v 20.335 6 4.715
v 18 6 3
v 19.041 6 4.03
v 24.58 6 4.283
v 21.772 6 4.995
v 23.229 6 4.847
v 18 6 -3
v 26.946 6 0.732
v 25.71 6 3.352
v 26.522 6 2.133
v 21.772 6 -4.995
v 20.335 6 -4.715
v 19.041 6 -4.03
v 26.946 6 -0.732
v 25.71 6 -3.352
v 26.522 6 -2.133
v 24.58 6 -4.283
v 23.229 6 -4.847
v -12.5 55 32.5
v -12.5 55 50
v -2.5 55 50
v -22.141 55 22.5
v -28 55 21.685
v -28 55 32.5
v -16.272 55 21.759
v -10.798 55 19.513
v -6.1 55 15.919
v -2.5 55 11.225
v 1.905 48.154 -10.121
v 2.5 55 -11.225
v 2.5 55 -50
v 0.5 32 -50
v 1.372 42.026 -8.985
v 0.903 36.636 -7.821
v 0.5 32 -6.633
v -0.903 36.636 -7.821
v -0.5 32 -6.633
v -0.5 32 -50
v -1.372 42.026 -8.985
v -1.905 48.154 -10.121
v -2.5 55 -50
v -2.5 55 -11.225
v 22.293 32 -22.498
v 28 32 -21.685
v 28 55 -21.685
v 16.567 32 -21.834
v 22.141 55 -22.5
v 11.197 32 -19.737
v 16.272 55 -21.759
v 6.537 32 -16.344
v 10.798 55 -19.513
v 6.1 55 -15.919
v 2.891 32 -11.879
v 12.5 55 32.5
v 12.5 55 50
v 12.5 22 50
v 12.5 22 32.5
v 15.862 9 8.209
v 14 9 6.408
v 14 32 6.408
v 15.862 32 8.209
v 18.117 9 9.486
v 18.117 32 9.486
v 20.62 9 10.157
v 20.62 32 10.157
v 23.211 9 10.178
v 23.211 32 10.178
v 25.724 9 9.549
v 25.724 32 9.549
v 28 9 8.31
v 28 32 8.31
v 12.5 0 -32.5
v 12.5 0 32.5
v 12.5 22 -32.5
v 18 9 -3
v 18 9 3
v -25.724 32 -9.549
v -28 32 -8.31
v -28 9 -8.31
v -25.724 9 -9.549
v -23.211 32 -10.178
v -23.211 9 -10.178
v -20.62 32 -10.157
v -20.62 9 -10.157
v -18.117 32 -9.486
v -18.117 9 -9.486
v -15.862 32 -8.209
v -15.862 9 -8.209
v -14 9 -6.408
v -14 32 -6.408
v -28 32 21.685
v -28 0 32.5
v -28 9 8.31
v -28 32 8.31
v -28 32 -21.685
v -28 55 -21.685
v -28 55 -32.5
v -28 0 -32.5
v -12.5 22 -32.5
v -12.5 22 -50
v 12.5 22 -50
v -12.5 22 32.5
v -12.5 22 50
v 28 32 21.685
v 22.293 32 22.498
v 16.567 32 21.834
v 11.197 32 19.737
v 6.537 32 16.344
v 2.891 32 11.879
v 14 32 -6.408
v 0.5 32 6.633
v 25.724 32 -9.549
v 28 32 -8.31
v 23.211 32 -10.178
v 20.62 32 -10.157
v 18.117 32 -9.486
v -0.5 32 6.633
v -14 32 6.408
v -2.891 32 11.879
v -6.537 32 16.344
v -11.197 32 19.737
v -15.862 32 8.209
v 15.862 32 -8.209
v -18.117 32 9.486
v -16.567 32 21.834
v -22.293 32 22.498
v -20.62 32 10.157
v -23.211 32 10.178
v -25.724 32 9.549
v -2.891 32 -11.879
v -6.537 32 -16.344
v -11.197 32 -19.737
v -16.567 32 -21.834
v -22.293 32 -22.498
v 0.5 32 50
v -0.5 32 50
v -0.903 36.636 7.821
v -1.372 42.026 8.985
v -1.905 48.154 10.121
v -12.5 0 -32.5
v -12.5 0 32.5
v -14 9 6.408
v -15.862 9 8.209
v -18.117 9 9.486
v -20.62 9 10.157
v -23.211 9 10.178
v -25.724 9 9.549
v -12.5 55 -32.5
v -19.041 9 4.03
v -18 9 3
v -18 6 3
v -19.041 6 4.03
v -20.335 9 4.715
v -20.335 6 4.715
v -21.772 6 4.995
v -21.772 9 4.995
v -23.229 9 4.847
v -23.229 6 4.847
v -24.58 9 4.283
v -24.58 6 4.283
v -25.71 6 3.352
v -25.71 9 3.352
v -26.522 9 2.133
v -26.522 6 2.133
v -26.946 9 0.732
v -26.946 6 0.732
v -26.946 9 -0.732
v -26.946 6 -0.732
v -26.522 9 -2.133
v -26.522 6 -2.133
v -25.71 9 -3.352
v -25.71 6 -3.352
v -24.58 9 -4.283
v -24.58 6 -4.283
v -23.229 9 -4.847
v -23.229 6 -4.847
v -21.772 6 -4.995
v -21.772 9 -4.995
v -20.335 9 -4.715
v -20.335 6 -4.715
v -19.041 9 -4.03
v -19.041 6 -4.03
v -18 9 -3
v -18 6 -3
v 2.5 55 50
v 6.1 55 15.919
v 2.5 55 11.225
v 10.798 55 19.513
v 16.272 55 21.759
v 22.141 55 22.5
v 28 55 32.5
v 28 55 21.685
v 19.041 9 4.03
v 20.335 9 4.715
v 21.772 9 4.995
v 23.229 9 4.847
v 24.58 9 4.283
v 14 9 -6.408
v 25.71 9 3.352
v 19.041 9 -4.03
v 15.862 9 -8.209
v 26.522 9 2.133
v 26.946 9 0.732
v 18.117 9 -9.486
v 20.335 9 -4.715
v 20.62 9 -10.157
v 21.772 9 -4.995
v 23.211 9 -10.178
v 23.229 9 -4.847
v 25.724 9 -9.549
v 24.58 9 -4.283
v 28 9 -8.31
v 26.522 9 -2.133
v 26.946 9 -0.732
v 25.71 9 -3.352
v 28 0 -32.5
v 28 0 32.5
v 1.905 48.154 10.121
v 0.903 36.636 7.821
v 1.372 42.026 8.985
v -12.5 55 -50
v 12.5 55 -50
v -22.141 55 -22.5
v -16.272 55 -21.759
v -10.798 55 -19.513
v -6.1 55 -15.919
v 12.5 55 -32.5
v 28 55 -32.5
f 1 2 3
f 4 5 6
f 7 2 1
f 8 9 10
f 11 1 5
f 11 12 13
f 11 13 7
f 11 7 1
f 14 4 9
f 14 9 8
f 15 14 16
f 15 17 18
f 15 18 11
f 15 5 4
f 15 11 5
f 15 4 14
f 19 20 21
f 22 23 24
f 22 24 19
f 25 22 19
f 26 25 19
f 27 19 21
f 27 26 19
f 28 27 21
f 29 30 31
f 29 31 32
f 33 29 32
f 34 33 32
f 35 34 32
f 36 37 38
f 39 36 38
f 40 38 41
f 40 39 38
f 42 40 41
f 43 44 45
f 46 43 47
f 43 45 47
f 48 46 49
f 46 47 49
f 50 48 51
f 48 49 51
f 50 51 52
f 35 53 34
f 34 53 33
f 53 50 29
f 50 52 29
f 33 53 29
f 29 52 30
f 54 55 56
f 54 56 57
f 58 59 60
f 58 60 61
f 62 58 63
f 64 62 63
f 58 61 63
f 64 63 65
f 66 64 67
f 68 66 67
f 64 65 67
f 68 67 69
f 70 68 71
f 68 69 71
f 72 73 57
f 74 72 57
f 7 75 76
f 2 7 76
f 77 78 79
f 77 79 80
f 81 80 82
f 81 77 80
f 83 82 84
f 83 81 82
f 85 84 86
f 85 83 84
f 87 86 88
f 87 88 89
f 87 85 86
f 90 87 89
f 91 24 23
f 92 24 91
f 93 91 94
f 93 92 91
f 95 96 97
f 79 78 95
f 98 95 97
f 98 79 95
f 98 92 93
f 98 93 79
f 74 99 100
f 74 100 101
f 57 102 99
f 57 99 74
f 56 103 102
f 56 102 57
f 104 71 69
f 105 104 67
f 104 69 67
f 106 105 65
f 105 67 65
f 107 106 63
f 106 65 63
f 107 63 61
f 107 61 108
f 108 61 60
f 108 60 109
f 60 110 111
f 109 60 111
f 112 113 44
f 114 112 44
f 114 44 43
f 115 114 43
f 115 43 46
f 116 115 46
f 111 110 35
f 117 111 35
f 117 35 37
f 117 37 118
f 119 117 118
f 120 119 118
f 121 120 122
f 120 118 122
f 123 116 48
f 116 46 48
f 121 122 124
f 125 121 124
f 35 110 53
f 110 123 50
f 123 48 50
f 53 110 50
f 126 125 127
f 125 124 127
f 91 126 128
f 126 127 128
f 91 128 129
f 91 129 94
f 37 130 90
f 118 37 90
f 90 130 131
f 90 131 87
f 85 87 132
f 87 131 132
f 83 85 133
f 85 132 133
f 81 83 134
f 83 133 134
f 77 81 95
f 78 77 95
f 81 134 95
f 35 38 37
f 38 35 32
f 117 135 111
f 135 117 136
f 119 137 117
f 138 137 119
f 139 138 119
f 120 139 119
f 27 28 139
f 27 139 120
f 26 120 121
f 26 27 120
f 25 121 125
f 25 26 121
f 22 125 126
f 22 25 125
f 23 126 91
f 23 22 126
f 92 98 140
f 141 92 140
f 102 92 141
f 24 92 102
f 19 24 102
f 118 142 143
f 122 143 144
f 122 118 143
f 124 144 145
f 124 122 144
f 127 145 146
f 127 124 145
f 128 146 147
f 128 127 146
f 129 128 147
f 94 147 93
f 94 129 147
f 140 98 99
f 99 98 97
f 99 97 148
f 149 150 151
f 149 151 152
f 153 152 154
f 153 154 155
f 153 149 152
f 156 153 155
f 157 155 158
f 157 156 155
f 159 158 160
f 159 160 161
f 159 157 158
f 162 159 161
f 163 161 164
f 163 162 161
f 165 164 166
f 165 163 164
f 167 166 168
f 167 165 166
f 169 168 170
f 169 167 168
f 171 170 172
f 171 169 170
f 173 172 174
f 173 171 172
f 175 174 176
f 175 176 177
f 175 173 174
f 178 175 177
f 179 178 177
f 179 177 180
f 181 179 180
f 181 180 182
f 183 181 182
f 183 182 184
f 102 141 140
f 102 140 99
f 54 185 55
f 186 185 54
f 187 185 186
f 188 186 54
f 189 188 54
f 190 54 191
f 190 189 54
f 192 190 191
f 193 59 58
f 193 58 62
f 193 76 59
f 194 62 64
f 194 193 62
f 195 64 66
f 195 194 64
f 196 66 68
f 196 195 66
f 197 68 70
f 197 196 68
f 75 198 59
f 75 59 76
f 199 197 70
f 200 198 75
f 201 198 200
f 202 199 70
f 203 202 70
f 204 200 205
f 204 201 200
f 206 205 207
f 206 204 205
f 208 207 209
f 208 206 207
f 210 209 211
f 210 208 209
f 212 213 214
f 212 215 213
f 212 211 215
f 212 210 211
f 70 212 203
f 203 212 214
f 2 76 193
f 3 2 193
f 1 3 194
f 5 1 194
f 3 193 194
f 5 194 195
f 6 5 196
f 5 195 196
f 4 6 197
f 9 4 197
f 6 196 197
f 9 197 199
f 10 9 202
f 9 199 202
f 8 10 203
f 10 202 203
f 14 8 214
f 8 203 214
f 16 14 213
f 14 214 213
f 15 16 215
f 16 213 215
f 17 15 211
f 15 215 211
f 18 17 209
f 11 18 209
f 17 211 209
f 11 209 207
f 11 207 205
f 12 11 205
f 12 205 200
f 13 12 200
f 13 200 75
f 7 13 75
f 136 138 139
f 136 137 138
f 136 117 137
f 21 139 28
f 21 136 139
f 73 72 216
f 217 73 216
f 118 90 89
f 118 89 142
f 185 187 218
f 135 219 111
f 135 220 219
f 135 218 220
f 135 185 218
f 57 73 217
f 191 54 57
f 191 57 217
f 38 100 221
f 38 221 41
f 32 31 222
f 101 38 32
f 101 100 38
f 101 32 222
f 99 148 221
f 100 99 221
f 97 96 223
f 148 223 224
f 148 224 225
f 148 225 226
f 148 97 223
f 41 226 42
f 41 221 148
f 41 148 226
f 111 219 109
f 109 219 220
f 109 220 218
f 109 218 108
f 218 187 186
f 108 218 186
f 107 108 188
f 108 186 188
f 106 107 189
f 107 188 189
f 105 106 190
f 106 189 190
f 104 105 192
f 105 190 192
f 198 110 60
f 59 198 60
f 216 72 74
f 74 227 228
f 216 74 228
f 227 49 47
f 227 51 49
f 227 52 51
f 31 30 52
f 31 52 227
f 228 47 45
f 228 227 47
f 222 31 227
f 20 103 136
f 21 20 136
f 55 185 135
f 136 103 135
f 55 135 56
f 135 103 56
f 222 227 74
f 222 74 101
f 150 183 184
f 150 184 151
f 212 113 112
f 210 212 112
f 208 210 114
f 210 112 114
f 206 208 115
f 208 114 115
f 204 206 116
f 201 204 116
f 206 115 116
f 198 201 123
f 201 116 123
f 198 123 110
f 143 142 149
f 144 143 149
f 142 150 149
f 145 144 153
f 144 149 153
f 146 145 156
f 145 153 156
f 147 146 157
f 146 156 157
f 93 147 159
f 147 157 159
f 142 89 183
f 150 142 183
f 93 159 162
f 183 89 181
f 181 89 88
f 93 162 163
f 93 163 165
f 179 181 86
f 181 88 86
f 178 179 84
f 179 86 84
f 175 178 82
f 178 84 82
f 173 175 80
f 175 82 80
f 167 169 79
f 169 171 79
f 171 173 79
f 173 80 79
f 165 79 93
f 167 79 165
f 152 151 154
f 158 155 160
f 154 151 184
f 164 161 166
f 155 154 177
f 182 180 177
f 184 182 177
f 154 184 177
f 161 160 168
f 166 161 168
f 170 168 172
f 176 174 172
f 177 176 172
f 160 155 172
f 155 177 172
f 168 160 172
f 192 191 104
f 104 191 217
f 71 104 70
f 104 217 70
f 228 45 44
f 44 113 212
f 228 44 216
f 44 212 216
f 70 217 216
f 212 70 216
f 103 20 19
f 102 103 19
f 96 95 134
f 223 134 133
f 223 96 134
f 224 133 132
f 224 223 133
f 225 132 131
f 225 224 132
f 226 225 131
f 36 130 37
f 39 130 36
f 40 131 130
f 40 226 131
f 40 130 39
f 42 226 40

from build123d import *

# Parameters (mm, degrees)
SKETCH1_W           = 56
SKETCH1_H           = 100
BOSS_EXTRUDE1_DEPTH = 55
CUT_EXTRUDE2_DEPTH  = 118.511701545
SKETCH7_R           = 22.5
SKETCH7_R_2         = 10
CUT_EXTRUDE4_DEPTH  = 23
CUT_EXTRUDE5_DEPTH  = 46
CUT_EXTRUDE6_DEPTH  = 3
CUT_EXTRUDE7_DEPTH  = 23
SKETCH12_W          = 15.5
SKETCH12_H          = 17.5
CUT_EXTRUDE8_DEPTH  = 80.429213769
SKETCH13_W          = 25
SKETCH13_H          = 22
CUT_EXTRUDE9_DEPTH  = 118.511701545


with BuildPart() as part:
    # Sketch1 → Boss-Extrude1 (new body)
    with BuildSketch(Plane(origin=(0, 0, 0), x_dir=(1, 0, 0), z_dir=(0, 1, 0))):
        Rectangle(SKETCH1_W, SKETCH1_H)
    extrude(amount=BOSS_EXTRUDE1_DEPTH)

    # Sketch3 → Cut-Extrude2 (cut, through all)
    with BuildSketch(Plane.XY.offset(50)):
        Polygon((-0.5, 32), (-2.5, 55), (2.5, 55), (0.5, 32), align=None)
    extrude(amount=-CUT_EXTRUDE2_DEPTH, mode=Mode.SUBTRACT)

    # Sketch7 → Cut-Extrude4 (cut)
    with BuildSketch(Plane(origin=(0, 55, 0), x_dir=(1, 0, 0), z_dir=(0, 1, 0))):
        with Locations((22, 0)):
            Circle(SKETCH7_R)
        with Locations((22, 0)):
            Circle(SKETCH7_R_2, mode=Mode.SUBTRACT)
    cut_extrude4 = extrude(amount=-CUT_EXTRUDE4_DEPTH, mode=Mode.SUBTRACT)

    # Sketch9 → Cut-Extrude5 (cut)
    with BuildSketch(Plane(origin=(0, 55, 0), x_dir=(1, 0, 0), z_dir=(0, 1, 0))):
        with BuildLine():
            Line((14, 6.408002809), (14, -6.408002809))
            ThreePointArc((14, -6.408002809), (32.25, 0), (14, 6.408002809))
        make_face()
    cut_extrude5 = extrude(amount=-CUT_EXTRUDE5_DEPTH, mode=Mode.SUBTRACT)

    # Sketch10 → Cut-Extrude6 (cut)
    with BuildSketch(Plane(origin=(0, 9, 0), x_dir=(1, 0, 0), z_dir=(0, 1, 0))):
        with BuildLine():
            Line((18, 3), (18, -3))
            ThreePointArc((18, -3), (27, 0), (18, 3))
        make_face()
    cut_extrude6 = extrude(amount=-CUT_EXTRUDE6_DEPTH, mode=Mode.SUBTRACT)

    # Sketch11 → Cut-Extrude7 (cut)
    with BuildSketch(Plane(origin=(0, 55, 0), x_dir=(1, 0, 0), z_dir=(0, 1, 0))):
        with BuildLine():
            Line((14, 6.408002809), (14, -6.408002809))
            ThreePointArc((14, -6.408002809), (11.677076266, 0), (14, 6.408002809))
        make_face()
    cut_extrude7 = extrude(amount=-CUT_EXTRUDE7_DEPTH, mode=Mode.SUBTRACT)

    # Mirror1: Cut-Extrude4, Cut-Extrude5, Cut-Extrude6, Cut-Extrude7 across plane
    add(cut_extrude4.mirror(Plane(origin=(0, 0, 0), x_dir=(0, 0, 1), z_dir=(1, 0, 0))), mode=Mode.SUBTRACT)
    add(cut_extrude5.mirror(Plane(origin=(0, 0, 0), x_dir=(0, 0, 1), z_dir=(1, 0, 0))), mode=Mode.SUBTRACT)
    add(cut_extrude6.mirror(Plane(origin=(0, 0, 0), x_dir=(0, 0, 1), z_dir=(1, 0, 0))), mode=Mode.SUBTRACT)
    add(cut_extrude7.mirror(Plane(origin=(0, 0, 0), x_dir=(0, 0, 1), z_dir=(1, 0, 0))), mode=Mode.SUBTRACT)

    # Sketch12 → Cut-Extrude8 (cut, through all)
    with BuildSketch(Plane(origin=(0, 55, 0), x_dir=(1, 0, 0), z_dir=(0, 1, 0))):
        with Locations((-20.25, 41.25)):
            Rectangle(SKETCH12_W, SKETCH12_H)
        with Locations((20.25, 41.25)):
            Rectangle(SKETCH12_W, SKETCH12_H)
        with Locations((-20.25, -41.25)):
            Rectangle(SKETCH12_W, SKETCH12_H)
        with Locations((20.25, -41.25)):
            Rectangle(SKETCH12_W, SKETCH12_H)
    extrude(amount=-CUT_EXTRUDE8_DEPTH, mode=Mode.SUBTRACT)

    # Sketch13 → Cut-Extrude9 (cut, through all)
    with BuildSketch(Plane.XY.offset(50)):
        with Locations((0, 11)):
            Rectangle(SKETCH13_W, SKETCH13_H)
    extrude(amount=-CUT_EXTRUDE9_DEPTH, mode=Mode.SUBTRACT)


solid = part.part
